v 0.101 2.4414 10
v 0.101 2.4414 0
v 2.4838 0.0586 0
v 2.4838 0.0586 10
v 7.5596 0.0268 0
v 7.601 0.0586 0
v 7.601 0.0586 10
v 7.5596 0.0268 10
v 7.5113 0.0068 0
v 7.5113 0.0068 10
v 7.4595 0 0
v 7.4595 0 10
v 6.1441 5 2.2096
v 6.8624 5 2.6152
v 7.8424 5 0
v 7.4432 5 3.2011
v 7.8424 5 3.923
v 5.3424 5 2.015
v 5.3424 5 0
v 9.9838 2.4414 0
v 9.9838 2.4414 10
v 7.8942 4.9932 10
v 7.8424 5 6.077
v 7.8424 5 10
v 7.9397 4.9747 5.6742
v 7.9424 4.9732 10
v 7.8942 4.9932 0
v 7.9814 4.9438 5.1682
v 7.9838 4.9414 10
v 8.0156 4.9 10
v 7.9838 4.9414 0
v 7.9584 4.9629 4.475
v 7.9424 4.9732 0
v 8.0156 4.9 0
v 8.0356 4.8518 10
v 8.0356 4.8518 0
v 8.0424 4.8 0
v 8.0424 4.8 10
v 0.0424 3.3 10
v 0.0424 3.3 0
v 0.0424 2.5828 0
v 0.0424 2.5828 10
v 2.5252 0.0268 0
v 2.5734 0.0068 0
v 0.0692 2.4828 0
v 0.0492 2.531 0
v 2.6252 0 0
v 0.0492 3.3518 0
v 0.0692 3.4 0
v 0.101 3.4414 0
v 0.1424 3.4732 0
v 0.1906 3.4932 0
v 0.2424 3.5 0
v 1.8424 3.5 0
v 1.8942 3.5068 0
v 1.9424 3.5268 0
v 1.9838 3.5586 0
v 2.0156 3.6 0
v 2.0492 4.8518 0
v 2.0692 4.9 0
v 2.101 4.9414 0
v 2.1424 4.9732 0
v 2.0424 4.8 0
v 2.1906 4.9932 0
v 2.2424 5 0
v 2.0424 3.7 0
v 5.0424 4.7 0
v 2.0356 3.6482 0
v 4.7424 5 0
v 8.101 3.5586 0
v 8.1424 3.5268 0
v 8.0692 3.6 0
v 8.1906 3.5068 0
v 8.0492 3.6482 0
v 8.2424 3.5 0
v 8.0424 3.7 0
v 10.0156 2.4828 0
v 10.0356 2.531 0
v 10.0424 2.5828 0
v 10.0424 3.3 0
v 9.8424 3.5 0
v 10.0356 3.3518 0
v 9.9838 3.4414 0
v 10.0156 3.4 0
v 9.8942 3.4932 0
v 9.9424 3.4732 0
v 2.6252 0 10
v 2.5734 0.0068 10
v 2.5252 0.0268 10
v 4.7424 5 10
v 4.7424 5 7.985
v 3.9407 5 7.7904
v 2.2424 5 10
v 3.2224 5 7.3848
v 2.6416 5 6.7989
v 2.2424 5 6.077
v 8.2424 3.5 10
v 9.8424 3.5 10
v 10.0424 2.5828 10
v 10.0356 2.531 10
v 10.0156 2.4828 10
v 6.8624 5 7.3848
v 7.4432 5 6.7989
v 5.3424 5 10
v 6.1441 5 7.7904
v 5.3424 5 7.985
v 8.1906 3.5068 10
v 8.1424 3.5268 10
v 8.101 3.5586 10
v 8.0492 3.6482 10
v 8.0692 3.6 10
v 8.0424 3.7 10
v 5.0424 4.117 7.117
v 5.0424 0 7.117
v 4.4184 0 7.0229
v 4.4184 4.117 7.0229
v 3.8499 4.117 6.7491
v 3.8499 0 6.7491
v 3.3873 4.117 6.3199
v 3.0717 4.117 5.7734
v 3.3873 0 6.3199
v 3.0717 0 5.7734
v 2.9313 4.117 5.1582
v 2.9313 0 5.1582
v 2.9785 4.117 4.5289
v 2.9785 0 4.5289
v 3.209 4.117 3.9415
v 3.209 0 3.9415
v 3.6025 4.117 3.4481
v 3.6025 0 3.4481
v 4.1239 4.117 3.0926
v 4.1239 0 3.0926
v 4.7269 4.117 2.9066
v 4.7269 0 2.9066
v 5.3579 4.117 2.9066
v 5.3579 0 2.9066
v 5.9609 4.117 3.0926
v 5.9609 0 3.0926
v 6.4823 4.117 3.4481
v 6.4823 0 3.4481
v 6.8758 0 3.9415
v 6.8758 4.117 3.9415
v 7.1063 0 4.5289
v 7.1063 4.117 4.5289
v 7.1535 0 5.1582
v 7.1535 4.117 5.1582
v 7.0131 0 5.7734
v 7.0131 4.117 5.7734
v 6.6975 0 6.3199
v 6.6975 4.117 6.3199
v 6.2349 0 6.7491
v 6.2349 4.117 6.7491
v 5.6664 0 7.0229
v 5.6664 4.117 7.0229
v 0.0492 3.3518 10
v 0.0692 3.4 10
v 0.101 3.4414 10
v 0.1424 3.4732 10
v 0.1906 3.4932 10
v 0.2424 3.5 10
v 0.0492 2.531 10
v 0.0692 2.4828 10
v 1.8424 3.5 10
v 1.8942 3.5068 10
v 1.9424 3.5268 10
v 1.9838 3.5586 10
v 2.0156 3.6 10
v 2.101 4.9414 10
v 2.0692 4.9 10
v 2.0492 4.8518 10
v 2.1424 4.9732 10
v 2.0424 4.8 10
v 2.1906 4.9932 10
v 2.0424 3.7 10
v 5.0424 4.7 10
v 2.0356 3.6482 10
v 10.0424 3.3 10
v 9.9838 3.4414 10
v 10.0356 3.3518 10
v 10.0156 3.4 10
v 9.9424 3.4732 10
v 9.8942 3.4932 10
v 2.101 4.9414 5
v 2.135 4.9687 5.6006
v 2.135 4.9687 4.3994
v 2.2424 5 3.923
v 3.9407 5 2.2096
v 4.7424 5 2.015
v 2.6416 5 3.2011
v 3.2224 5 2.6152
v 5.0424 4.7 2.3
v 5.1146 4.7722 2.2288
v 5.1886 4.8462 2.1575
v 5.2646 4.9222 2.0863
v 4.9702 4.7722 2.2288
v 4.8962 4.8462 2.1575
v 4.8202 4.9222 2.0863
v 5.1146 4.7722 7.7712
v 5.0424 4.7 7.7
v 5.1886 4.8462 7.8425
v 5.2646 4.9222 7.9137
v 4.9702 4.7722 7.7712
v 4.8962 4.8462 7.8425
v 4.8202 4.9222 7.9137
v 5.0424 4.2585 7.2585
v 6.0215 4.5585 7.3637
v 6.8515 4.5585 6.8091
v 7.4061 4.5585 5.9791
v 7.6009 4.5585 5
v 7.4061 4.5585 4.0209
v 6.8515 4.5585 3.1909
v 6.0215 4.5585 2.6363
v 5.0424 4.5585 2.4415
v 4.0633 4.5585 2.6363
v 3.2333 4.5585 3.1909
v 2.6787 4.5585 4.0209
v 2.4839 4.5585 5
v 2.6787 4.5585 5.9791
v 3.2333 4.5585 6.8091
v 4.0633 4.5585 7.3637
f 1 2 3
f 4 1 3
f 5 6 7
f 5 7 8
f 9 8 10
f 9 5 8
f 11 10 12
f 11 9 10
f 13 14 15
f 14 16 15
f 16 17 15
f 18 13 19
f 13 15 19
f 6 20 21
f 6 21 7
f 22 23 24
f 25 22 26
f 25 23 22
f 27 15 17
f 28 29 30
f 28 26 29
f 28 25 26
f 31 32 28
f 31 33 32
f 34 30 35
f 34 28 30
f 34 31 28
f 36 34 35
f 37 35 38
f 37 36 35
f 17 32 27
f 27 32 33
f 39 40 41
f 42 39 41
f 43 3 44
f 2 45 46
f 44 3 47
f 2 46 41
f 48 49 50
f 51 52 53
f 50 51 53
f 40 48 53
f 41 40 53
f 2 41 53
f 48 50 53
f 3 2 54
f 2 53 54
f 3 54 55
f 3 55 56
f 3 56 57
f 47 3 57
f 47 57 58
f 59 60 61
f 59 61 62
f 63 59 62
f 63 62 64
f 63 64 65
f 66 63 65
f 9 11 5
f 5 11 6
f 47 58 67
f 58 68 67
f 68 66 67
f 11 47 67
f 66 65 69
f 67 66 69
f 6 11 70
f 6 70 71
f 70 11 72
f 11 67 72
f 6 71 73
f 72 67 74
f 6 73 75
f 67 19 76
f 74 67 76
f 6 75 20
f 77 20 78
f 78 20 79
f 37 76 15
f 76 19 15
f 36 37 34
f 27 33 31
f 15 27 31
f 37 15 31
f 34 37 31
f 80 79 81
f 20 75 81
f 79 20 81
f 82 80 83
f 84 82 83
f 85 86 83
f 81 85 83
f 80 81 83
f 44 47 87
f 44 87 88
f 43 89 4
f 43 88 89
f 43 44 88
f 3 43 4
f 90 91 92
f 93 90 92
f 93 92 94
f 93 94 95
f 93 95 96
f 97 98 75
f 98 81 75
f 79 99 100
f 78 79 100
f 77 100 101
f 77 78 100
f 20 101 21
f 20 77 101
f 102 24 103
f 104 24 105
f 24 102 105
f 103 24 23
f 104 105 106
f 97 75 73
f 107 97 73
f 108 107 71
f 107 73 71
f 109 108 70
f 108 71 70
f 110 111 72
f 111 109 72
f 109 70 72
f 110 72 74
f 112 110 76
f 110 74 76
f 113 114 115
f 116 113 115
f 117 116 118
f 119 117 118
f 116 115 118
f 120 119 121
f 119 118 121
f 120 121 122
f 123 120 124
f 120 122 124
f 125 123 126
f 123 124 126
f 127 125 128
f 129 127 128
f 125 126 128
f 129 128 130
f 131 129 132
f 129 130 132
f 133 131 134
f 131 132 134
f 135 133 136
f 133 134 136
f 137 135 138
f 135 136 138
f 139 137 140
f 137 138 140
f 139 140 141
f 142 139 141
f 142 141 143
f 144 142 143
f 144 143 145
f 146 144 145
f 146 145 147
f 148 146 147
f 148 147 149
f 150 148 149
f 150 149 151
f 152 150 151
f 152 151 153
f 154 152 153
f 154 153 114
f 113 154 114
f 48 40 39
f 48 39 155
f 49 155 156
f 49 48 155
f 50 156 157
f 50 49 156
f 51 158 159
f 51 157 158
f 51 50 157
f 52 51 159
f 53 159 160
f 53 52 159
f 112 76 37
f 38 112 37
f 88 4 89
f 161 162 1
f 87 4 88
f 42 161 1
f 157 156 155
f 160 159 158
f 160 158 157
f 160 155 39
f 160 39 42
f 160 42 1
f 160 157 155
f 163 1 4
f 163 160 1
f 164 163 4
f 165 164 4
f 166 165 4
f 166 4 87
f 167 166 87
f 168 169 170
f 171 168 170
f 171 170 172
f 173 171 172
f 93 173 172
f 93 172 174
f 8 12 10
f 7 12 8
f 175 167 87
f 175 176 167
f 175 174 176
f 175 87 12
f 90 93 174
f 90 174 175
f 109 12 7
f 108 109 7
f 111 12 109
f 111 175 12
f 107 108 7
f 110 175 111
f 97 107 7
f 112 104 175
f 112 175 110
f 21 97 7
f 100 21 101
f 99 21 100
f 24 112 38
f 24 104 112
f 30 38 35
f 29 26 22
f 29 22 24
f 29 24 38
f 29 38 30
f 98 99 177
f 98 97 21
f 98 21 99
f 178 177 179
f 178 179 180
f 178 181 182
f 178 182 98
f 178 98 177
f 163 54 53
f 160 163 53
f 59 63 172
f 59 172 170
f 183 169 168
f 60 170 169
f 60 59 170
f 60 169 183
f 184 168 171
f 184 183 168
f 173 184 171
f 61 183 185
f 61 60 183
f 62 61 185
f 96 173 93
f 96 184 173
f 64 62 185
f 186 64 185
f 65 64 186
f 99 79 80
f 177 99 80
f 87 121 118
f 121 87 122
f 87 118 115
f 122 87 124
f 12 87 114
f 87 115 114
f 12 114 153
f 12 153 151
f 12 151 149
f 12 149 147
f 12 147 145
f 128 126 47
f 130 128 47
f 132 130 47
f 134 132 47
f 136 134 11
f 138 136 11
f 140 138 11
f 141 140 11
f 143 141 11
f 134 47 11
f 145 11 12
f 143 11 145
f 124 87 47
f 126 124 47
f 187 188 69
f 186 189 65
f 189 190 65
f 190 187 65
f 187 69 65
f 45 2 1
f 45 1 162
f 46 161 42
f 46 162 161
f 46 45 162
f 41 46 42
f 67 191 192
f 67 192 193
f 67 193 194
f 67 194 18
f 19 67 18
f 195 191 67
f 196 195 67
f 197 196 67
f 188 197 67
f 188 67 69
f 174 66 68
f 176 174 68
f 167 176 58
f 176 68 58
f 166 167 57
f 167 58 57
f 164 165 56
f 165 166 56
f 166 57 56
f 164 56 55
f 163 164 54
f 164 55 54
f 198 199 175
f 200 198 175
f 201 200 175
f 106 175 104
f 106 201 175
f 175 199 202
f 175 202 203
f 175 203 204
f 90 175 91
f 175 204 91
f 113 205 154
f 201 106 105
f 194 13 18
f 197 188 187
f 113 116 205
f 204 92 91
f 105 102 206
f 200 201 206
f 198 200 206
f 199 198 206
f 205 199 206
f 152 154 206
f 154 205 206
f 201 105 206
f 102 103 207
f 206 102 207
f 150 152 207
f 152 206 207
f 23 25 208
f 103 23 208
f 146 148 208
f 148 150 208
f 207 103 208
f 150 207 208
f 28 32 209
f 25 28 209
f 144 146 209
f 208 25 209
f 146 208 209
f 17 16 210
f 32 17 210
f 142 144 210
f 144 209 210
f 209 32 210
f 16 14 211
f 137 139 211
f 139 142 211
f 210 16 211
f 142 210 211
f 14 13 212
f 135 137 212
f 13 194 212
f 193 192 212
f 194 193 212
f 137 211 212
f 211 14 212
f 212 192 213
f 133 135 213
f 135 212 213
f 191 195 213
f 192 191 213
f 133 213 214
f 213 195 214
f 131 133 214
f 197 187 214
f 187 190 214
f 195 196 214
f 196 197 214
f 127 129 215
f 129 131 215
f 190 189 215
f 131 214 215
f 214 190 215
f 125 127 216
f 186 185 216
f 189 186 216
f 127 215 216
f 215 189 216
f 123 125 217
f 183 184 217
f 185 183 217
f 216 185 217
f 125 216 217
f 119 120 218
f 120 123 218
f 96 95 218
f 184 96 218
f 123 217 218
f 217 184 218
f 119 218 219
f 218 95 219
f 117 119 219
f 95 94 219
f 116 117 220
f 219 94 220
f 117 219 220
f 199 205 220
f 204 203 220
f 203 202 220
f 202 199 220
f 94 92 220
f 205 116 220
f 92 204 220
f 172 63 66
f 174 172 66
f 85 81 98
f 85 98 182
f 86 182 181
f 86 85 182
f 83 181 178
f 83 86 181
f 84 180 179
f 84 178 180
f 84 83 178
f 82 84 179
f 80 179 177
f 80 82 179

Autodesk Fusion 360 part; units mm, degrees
sketch "Sketch1" plane through (0, 0, 0) normal (0, 0, 1) x (1, 0, 0)
  line L0 (2.6252, 0) -> (7.4595, 0)
  line L1 (10.0424, 2.5828) -> (10.0424, 3.3)
  line L2 (0.0424, 3.3) -> (0.0424, 2.5828)
  line L3 (8.0424, 3.7) -> (8.0424, 4.8)
  line L4 (2.0424, 4.8) -> (2.0424, 3.7)
  line L5 (0.101, 2.4414) -> (2.4838, 0.0586)
  line L6 (0.0424, 2.5) -> (3.5052, 2.5) construction
  line L7 (5.0424, 3.5) -> (5.0424, 0) construction
  line L8 (9.9838, 2.4414) -> (7.601, 0.0586)
  line L9 (9.8424, 3.5) -> (8.2424, 3.5)
  line L10 (1.8424, 3.5) -> (0.2424, 3.5)
  line L11 (5.0424, 4.7) -> (5.3424, 5)
  line L12 (5.0424, 4.7) -> (6.213, 4.7) construction
  line L13 (5.0424, 4.7) -> (4.7424, 5)
  line L14 (5.0424, 4.7) -> (6.2088, 4.7) construction
  line L15 (7.8424, 5) -> (5.3424, 5)
  line L16 (4.7424, 5) -> (2.2424, 5)
  arc A0 (0.2424, 3.5) -> (0.0424, 3.3) centre (0.2424, 3.3) ccw
  arc A1 (0.0424, 2.5828) -> (0.101, 2.4414) centre (0.2424, 2.5828) ccw
  arc A2 (2.4838, 0.0586) -> (2.6252, 0) centre (2.6252, 0.2) ccw
  arc A3 (7.4595, 0) -> (7.601, 0.0586) centre (7.4595, 0.2) ccw
  arc A4 (9.9838, 2.4414) -> (10.0424, 2.5828) centre (9.8424, 2.5828) ccw
  arc A5 (10.0424, 3.3) -> (9.8424, 3.5) centre (9.8424, 3.3) ccw
  arc A6 (8.0424, 3.7) -> (8.2424, 3.5) centre (8.2424, 3.7) ccw
  arc A7 (8.0424, 4.8) -> (7.8424, 5) centre (7.8424, 4.8) ccw
  arc A8 (2.2424, 5) -> (2.0424, 4.8) centre (2.2424, 4.8) ccw
  arc A9 (1.8424, 3.5) -> (2.0424, 3.7) centre (1.8424, 3.7) ccw
  dimension "d1" = 10
  dimension "d4" = 5
  dimension "d5" = 45
  dimension "d6" = 1
  dimension "d7" = 5
  dimension "d8" = 6
  dimension "d9" = 2
  dimension "d10" = 2
  dimension "d12" = 45
  dimension "d13" = 0.3
  dimension "d14" = 5
  dimension "d15" = 1.5
  dimension "d16" = 0.2
extrude "Extrude1" add sketch "Sketch1" along normal blind 10
hole "Hole1" at (5.0424, 5, 5) direction (0, -1, 0) diameter 4.234 depth 5.834 tip angle 180 countersink diameter 6 countersink angle 90
